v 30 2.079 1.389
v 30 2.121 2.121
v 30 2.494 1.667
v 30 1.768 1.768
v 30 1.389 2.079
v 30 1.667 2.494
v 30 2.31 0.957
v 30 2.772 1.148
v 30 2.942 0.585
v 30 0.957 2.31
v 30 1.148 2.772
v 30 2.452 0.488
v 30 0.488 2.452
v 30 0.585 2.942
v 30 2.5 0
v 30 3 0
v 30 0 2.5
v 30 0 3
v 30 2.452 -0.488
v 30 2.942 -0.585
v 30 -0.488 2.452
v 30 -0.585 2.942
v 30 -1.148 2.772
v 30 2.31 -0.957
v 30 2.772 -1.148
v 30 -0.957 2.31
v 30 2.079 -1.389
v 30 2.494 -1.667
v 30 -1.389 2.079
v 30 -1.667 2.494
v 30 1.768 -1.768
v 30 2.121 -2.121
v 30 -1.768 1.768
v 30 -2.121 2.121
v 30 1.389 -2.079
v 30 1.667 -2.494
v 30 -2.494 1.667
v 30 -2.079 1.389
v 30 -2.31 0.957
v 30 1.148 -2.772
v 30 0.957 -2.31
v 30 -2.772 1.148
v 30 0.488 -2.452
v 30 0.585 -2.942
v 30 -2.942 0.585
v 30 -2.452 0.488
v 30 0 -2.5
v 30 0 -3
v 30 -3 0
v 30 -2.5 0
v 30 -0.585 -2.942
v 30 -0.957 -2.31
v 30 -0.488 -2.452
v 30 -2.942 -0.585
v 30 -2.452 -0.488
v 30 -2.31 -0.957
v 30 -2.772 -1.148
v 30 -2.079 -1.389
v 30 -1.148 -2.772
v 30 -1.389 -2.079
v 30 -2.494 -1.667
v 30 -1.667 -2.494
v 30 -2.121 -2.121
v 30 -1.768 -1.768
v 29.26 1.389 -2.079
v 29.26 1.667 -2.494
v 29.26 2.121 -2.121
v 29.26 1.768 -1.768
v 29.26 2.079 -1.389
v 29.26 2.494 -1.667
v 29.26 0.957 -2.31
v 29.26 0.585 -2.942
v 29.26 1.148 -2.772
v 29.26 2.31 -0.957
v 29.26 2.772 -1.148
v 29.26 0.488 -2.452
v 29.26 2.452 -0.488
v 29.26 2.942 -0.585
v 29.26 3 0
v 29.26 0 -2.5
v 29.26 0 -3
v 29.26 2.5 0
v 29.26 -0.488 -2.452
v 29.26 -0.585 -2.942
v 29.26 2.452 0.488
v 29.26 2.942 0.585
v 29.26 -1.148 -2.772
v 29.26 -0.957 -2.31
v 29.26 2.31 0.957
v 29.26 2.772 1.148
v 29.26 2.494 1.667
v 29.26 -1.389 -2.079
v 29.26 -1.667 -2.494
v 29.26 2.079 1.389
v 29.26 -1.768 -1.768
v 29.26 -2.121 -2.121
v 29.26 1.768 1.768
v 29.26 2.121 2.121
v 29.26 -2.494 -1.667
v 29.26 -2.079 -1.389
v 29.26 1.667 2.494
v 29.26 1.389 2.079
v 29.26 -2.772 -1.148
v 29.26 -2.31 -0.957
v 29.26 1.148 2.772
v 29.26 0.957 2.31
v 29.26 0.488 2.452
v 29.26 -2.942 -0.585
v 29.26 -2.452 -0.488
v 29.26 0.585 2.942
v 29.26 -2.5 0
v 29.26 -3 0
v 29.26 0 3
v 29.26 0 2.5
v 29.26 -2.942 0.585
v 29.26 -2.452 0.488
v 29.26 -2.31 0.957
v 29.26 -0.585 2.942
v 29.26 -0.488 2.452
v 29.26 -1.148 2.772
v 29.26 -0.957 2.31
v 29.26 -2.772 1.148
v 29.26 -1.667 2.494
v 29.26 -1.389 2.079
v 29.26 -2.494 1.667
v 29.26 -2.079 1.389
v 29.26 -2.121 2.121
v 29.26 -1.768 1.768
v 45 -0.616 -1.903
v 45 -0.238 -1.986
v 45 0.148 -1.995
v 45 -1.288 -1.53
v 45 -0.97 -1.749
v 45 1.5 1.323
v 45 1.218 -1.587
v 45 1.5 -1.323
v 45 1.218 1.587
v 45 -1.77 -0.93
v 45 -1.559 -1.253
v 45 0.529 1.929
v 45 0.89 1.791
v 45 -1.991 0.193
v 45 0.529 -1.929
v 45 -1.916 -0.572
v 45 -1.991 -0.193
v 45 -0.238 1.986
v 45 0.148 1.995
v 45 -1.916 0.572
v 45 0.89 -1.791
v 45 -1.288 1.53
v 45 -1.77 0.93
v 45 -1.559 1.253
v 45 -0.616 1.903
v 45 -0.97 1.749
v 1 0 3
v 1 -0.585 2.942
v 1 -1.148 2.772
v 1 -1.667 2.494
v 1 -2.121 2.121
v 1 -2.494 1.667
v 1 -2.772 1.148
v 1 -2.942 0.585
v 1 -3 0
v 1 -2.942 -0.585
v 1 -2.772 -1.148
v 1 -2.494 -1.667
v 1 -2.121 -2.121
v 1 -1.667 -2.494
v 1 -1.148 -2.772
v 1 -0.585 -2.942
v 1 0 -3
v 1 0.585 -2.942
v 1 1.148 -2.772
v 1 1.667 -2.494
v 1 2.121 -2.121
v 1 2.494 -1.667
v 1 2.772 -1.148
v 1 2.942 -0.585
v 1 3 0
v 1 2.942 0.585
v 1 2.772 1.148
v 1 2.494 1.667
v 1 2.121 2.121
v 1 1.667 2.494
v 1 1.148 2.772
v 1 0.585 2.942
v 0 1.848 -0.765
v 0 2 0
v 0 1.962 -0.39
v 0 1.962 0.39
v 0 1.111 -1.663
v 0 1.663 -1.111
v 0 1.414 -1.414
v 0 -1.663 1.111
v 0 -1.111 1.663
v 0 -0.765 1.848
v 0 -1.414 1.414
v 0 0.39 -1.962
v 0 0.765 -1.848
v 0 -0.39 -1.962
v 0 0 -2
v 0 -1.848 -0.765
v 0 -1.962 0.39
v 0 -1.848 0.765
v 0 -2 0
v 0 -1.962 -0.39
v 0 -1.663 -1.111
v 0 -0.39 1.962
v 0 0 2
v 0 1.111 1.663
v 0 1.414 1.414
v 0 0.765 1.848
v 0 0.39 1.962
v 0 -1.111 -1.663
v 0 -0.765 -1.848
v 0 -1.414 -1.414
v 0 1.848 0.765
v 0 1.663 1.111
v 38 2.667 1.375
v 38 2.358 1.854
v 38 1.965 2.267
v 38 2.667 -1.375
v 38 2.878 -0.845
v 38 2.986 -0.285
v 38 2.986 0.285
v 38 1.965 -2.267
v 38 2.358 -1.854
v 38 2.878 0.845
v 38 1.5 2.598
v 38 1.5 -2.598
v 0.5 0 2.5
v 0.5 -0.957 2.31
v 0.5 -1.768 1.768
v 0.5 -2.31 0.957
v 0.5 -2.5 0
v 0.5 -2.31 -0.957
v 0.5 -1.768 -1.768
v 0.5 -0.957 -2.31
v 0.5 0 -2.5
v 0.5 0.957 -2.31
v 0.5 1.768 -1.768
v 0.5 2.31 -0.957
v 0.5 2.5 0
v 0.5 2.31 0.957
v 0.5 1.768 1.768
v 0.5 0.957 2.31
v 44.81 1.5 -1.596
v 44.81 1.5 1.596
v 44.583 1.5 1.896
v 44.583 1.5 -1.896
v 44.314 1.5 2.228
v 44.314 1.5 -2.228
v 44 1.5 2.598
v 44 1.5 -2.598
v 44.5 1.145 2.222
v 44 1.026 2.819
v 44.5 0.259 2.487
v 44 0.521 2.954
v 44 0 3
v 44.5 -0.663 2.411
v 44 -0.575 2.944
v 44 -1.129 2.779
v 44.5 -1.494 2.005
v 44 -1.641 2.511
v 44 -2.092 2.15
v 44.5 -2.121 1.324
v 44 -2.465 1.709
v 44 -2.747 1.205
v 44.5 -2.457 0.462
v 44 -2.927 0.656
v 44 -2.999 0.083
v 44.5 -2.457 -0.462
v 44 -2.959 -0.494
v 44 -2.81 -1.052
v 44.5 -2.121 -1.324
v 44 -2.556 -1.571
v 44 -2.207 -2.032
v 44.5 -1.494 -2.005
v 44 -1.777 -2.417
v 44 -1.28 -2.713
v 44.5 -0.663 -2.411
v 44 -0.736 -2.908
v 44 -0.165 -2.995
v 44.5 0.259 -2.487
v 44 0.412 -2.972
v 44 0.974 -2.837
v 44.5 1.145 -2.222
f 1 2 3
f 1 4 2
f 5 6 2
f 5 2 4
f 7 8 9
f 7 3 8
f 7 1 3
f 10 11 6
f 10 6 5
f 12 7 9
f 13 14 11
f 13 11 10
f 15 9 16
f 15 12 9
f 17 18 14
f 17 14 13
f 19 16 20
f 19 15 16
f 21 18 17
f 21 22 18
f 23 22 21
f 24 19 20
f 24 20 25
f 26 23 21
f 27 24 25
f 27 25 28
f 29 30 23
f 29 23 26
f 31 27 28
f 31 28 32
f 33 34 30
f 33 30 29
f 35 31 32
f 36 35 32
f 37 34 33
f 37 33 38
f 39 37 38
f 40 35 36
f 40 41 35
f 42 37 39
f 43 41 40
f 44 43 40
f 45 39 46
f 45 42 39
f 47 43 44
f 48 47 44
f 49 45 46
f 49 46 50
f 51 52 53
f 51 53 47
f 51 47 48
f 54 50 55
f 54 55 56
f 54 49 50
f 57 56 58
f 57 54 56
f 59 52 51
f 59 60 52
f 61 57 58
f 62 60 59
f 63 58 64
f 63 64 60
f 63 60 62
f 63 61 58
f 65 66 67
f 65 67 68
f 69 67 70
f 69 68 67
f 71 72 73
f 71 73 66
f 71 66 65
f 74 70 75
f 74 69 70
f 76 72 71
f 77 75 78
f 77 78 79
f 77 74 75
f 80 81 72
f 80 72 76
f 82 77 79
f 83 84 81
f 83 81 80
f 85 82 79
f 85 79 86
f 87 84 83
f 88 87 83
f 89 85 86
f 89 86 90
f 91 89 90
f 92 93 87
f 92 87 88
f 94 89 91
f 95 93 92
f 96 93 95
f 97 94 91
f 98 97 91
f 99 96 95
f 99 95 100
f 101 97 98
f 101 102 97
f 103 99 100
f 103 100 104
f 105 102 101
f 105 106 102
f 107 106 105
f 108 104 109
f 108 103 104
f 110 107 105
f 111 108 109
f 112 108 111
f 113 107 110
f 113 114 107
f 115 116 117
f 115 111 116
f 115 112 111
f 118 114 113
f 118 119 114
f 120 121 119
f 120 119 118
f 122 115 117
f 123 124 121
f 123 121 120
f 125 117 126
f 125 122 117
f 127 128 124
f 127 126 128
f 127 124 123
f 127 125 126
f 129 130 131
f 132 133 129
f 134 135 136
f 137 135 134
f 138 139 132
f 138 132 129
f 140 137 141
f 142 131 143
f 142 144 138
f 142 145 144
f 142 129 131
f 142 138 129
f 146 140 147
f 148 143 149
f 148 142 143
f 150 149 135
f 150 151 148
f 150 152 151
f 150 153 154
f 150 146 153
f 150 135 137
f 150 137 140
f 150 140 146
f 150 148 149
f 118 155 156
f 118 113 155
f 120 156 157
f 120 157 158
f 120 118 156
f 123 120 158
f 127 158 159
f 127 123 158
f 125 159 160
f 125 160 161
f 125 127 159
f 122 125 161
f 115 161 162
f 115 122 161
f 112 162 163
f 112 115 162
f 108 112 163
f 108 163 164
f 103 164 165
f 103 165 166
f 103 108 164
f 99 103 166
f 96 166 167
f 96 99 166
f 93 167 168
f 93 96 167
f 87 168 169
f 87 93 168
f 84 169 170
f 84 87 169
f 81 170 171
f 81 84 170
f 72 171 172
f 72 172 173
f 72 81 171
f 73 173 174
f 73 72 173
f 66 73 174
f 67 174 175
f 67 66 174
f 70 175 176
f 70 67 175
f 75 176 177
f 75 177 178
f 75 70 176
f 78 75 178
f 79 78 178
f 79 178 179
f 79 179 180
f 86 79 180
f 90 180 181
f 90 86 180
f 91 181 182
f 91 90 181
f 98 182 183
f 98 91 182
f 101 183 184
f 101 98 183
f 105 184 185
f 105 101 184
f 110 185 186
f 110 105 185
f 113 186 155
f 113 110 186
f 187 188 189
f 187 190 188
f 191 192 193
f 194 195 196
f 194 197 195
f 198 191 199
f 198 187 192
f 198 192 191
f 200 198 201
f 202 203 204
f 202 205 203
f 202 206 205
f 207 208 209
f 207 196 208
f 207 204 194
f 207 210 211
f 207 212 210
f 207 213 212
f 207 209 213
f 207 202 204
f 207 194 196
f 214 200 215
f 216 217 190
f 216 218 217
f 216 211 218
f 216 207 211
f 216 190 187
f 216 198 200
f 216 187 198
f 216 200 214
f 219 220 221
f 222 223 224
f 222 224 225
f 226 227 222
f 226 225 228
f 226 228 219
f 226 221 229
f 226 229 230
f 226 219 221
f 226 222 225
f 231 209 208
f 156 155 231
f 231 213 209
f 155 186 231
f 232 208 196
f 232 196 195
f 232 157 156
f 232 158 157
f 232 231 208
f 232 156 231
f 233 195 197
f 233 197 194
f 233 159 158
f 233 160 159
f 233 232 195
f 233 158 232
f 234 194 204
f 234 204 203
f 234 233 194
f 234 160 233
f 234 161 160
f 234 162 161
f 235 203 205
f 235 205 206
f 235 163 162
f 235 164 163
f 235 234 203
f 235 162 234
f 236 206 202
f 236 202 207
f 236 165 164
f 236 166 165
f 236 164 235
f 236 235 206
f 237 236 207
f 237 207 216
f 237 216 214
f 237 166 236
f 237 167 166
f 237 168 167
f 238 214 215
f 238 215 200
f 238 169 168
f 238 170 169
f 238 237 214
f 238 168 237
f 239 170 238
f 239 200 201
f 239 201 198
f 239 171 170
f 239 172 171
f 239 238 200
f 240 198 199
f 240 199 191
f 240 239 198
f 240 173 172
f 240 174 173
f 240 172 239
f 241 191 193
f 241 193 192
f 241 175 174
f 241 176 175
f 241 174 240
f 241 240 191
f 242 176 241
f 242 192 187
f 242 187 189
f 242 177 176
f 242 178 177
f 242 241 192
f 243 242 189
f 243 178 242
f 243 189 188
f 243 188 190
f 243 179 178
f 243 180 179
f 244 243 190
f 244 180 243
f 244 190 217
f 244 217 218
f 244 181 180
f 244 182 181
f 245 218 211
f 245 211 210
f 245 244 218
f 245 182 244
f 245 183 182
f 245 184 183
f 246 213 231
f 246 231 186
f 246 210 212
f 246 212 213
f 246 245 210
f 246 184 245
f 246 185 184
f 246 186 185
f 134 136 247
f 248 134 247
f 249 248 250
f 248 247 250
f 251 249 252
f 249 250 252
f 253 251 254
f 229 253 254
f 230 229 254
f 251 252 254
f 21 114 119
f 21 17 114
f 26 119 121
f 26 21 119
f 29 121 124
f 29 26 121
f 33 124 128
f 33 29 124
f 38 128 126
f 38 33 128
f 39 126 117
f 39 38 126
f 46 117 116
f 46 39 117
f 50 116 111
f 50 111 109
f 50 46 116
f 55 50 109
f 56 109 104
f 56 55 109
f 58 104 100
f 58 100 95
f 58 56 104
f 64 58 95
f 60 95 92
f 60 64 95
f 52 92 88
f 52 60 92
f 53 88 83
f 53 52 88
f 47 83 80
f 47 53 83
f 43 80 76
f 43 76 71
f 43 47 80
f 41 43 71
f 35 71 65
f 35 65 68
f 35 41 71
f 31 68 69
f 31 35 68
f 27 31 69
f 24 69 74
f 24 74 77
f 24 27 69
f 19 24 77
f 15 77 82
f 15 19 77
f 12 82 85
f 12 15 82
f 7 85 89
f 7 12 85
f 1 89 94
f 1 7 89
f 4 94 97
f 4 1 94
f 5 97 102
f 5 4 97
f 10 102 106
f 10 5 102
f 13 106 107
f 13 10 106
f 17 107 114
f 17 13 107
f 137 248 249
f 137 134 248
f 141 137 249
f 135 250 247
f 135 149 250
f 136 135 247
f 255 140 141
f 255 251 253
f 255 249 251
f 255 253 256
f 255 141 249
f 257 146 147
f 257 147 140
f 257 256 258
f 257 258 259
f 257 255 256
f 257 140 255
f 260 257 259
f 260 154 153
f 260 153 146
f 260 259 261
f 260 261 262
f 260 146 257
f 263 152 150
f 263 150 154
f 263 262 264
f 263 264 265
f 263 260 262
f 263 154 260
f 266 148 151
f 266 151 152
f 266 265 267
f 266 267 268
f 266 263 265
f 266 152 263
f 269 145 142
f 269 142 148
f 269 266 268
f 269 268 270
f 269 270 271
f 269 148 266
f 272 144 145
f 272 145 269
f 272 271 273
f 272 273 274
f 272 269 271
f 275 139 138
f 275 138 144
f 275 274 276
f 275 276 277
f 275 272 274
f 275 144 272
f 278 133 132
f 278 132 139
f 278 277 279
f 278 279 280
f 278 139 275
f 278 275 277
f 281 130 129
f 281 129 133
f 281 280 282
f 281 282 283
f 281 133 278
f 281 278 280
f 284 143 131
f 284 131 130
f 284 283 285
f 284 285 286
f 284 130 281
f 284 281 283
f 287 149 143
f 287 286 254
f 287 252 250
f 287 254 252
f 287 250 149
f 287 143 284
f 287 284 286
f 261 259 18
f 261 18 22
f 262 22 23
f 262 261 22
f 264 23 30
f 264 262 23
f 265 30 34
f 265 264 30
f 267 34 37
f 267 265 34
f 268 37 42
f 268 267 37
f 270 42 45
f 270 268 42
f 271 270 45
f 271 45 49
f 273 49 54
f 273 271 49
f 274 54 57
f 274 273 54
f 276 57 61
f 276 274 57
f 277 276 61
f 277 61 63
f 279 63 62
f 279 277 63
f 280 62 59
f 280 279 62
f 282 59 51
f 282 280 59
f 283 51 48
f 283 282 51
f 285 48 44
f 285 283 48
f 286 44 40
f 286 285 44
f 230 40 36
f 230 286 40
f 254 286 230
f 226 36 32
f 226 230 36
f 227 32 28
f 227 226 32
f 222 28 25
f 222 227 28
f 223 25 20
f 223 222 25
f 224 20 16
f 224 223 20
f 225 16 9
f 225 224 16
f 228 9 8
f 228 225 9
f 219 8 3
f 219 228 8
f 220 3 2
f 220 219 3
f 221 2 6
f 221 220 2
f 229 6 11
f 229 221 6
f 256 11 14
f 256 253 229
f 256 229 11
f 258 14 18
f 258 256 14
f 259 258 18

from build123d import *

# Parameters (mm, degrees)
ESQUISSE2_W             = 7.209705372
ESQUISSE2_H             = 2.76140959
ENL_V_MAT_EXTRU_1_DEPTH = 7


with BuildPart() as part:
    # Esquisse1 → Révolution1 (revolve)
    with BuildSketch(Plane.XY, mode=Mode.PRIVATE) as r_volution1_sk:
        Polygon((0, 0), (0, 2), (1, 3), (29.26, 3), (29.26, 2.5), (30, 2.5), (30, 3), (44, 3), (45, 2), (45, 0), align=None)
    revolve(r_volution1_sk.sketch.rotate(Axis((-55.939428076, 0, 0), (1, 0, 0)), 90), axis=Axis((-55.939428076, 0, 0), (1, 0, 0)))  # turned: the seam where the file's is

    # Esquisse2 → Enlèv. mat.-Extru.1 (cut)
    with BuildSketch(Plane(origin=(45, 0, 0), x_dir=(0, 0, -1), z_dir=(1, 0, 0))):
        with Locations((-0.271519353, 2.880704795)):
            Rectangle(ESQUISSE2_W, ESQUISSE2_H)
    extrude(amount=-ENL_V_MAT_EXTRU_1_DEPTH, mode=Mode.SUBTRACT)


solid = part.part
